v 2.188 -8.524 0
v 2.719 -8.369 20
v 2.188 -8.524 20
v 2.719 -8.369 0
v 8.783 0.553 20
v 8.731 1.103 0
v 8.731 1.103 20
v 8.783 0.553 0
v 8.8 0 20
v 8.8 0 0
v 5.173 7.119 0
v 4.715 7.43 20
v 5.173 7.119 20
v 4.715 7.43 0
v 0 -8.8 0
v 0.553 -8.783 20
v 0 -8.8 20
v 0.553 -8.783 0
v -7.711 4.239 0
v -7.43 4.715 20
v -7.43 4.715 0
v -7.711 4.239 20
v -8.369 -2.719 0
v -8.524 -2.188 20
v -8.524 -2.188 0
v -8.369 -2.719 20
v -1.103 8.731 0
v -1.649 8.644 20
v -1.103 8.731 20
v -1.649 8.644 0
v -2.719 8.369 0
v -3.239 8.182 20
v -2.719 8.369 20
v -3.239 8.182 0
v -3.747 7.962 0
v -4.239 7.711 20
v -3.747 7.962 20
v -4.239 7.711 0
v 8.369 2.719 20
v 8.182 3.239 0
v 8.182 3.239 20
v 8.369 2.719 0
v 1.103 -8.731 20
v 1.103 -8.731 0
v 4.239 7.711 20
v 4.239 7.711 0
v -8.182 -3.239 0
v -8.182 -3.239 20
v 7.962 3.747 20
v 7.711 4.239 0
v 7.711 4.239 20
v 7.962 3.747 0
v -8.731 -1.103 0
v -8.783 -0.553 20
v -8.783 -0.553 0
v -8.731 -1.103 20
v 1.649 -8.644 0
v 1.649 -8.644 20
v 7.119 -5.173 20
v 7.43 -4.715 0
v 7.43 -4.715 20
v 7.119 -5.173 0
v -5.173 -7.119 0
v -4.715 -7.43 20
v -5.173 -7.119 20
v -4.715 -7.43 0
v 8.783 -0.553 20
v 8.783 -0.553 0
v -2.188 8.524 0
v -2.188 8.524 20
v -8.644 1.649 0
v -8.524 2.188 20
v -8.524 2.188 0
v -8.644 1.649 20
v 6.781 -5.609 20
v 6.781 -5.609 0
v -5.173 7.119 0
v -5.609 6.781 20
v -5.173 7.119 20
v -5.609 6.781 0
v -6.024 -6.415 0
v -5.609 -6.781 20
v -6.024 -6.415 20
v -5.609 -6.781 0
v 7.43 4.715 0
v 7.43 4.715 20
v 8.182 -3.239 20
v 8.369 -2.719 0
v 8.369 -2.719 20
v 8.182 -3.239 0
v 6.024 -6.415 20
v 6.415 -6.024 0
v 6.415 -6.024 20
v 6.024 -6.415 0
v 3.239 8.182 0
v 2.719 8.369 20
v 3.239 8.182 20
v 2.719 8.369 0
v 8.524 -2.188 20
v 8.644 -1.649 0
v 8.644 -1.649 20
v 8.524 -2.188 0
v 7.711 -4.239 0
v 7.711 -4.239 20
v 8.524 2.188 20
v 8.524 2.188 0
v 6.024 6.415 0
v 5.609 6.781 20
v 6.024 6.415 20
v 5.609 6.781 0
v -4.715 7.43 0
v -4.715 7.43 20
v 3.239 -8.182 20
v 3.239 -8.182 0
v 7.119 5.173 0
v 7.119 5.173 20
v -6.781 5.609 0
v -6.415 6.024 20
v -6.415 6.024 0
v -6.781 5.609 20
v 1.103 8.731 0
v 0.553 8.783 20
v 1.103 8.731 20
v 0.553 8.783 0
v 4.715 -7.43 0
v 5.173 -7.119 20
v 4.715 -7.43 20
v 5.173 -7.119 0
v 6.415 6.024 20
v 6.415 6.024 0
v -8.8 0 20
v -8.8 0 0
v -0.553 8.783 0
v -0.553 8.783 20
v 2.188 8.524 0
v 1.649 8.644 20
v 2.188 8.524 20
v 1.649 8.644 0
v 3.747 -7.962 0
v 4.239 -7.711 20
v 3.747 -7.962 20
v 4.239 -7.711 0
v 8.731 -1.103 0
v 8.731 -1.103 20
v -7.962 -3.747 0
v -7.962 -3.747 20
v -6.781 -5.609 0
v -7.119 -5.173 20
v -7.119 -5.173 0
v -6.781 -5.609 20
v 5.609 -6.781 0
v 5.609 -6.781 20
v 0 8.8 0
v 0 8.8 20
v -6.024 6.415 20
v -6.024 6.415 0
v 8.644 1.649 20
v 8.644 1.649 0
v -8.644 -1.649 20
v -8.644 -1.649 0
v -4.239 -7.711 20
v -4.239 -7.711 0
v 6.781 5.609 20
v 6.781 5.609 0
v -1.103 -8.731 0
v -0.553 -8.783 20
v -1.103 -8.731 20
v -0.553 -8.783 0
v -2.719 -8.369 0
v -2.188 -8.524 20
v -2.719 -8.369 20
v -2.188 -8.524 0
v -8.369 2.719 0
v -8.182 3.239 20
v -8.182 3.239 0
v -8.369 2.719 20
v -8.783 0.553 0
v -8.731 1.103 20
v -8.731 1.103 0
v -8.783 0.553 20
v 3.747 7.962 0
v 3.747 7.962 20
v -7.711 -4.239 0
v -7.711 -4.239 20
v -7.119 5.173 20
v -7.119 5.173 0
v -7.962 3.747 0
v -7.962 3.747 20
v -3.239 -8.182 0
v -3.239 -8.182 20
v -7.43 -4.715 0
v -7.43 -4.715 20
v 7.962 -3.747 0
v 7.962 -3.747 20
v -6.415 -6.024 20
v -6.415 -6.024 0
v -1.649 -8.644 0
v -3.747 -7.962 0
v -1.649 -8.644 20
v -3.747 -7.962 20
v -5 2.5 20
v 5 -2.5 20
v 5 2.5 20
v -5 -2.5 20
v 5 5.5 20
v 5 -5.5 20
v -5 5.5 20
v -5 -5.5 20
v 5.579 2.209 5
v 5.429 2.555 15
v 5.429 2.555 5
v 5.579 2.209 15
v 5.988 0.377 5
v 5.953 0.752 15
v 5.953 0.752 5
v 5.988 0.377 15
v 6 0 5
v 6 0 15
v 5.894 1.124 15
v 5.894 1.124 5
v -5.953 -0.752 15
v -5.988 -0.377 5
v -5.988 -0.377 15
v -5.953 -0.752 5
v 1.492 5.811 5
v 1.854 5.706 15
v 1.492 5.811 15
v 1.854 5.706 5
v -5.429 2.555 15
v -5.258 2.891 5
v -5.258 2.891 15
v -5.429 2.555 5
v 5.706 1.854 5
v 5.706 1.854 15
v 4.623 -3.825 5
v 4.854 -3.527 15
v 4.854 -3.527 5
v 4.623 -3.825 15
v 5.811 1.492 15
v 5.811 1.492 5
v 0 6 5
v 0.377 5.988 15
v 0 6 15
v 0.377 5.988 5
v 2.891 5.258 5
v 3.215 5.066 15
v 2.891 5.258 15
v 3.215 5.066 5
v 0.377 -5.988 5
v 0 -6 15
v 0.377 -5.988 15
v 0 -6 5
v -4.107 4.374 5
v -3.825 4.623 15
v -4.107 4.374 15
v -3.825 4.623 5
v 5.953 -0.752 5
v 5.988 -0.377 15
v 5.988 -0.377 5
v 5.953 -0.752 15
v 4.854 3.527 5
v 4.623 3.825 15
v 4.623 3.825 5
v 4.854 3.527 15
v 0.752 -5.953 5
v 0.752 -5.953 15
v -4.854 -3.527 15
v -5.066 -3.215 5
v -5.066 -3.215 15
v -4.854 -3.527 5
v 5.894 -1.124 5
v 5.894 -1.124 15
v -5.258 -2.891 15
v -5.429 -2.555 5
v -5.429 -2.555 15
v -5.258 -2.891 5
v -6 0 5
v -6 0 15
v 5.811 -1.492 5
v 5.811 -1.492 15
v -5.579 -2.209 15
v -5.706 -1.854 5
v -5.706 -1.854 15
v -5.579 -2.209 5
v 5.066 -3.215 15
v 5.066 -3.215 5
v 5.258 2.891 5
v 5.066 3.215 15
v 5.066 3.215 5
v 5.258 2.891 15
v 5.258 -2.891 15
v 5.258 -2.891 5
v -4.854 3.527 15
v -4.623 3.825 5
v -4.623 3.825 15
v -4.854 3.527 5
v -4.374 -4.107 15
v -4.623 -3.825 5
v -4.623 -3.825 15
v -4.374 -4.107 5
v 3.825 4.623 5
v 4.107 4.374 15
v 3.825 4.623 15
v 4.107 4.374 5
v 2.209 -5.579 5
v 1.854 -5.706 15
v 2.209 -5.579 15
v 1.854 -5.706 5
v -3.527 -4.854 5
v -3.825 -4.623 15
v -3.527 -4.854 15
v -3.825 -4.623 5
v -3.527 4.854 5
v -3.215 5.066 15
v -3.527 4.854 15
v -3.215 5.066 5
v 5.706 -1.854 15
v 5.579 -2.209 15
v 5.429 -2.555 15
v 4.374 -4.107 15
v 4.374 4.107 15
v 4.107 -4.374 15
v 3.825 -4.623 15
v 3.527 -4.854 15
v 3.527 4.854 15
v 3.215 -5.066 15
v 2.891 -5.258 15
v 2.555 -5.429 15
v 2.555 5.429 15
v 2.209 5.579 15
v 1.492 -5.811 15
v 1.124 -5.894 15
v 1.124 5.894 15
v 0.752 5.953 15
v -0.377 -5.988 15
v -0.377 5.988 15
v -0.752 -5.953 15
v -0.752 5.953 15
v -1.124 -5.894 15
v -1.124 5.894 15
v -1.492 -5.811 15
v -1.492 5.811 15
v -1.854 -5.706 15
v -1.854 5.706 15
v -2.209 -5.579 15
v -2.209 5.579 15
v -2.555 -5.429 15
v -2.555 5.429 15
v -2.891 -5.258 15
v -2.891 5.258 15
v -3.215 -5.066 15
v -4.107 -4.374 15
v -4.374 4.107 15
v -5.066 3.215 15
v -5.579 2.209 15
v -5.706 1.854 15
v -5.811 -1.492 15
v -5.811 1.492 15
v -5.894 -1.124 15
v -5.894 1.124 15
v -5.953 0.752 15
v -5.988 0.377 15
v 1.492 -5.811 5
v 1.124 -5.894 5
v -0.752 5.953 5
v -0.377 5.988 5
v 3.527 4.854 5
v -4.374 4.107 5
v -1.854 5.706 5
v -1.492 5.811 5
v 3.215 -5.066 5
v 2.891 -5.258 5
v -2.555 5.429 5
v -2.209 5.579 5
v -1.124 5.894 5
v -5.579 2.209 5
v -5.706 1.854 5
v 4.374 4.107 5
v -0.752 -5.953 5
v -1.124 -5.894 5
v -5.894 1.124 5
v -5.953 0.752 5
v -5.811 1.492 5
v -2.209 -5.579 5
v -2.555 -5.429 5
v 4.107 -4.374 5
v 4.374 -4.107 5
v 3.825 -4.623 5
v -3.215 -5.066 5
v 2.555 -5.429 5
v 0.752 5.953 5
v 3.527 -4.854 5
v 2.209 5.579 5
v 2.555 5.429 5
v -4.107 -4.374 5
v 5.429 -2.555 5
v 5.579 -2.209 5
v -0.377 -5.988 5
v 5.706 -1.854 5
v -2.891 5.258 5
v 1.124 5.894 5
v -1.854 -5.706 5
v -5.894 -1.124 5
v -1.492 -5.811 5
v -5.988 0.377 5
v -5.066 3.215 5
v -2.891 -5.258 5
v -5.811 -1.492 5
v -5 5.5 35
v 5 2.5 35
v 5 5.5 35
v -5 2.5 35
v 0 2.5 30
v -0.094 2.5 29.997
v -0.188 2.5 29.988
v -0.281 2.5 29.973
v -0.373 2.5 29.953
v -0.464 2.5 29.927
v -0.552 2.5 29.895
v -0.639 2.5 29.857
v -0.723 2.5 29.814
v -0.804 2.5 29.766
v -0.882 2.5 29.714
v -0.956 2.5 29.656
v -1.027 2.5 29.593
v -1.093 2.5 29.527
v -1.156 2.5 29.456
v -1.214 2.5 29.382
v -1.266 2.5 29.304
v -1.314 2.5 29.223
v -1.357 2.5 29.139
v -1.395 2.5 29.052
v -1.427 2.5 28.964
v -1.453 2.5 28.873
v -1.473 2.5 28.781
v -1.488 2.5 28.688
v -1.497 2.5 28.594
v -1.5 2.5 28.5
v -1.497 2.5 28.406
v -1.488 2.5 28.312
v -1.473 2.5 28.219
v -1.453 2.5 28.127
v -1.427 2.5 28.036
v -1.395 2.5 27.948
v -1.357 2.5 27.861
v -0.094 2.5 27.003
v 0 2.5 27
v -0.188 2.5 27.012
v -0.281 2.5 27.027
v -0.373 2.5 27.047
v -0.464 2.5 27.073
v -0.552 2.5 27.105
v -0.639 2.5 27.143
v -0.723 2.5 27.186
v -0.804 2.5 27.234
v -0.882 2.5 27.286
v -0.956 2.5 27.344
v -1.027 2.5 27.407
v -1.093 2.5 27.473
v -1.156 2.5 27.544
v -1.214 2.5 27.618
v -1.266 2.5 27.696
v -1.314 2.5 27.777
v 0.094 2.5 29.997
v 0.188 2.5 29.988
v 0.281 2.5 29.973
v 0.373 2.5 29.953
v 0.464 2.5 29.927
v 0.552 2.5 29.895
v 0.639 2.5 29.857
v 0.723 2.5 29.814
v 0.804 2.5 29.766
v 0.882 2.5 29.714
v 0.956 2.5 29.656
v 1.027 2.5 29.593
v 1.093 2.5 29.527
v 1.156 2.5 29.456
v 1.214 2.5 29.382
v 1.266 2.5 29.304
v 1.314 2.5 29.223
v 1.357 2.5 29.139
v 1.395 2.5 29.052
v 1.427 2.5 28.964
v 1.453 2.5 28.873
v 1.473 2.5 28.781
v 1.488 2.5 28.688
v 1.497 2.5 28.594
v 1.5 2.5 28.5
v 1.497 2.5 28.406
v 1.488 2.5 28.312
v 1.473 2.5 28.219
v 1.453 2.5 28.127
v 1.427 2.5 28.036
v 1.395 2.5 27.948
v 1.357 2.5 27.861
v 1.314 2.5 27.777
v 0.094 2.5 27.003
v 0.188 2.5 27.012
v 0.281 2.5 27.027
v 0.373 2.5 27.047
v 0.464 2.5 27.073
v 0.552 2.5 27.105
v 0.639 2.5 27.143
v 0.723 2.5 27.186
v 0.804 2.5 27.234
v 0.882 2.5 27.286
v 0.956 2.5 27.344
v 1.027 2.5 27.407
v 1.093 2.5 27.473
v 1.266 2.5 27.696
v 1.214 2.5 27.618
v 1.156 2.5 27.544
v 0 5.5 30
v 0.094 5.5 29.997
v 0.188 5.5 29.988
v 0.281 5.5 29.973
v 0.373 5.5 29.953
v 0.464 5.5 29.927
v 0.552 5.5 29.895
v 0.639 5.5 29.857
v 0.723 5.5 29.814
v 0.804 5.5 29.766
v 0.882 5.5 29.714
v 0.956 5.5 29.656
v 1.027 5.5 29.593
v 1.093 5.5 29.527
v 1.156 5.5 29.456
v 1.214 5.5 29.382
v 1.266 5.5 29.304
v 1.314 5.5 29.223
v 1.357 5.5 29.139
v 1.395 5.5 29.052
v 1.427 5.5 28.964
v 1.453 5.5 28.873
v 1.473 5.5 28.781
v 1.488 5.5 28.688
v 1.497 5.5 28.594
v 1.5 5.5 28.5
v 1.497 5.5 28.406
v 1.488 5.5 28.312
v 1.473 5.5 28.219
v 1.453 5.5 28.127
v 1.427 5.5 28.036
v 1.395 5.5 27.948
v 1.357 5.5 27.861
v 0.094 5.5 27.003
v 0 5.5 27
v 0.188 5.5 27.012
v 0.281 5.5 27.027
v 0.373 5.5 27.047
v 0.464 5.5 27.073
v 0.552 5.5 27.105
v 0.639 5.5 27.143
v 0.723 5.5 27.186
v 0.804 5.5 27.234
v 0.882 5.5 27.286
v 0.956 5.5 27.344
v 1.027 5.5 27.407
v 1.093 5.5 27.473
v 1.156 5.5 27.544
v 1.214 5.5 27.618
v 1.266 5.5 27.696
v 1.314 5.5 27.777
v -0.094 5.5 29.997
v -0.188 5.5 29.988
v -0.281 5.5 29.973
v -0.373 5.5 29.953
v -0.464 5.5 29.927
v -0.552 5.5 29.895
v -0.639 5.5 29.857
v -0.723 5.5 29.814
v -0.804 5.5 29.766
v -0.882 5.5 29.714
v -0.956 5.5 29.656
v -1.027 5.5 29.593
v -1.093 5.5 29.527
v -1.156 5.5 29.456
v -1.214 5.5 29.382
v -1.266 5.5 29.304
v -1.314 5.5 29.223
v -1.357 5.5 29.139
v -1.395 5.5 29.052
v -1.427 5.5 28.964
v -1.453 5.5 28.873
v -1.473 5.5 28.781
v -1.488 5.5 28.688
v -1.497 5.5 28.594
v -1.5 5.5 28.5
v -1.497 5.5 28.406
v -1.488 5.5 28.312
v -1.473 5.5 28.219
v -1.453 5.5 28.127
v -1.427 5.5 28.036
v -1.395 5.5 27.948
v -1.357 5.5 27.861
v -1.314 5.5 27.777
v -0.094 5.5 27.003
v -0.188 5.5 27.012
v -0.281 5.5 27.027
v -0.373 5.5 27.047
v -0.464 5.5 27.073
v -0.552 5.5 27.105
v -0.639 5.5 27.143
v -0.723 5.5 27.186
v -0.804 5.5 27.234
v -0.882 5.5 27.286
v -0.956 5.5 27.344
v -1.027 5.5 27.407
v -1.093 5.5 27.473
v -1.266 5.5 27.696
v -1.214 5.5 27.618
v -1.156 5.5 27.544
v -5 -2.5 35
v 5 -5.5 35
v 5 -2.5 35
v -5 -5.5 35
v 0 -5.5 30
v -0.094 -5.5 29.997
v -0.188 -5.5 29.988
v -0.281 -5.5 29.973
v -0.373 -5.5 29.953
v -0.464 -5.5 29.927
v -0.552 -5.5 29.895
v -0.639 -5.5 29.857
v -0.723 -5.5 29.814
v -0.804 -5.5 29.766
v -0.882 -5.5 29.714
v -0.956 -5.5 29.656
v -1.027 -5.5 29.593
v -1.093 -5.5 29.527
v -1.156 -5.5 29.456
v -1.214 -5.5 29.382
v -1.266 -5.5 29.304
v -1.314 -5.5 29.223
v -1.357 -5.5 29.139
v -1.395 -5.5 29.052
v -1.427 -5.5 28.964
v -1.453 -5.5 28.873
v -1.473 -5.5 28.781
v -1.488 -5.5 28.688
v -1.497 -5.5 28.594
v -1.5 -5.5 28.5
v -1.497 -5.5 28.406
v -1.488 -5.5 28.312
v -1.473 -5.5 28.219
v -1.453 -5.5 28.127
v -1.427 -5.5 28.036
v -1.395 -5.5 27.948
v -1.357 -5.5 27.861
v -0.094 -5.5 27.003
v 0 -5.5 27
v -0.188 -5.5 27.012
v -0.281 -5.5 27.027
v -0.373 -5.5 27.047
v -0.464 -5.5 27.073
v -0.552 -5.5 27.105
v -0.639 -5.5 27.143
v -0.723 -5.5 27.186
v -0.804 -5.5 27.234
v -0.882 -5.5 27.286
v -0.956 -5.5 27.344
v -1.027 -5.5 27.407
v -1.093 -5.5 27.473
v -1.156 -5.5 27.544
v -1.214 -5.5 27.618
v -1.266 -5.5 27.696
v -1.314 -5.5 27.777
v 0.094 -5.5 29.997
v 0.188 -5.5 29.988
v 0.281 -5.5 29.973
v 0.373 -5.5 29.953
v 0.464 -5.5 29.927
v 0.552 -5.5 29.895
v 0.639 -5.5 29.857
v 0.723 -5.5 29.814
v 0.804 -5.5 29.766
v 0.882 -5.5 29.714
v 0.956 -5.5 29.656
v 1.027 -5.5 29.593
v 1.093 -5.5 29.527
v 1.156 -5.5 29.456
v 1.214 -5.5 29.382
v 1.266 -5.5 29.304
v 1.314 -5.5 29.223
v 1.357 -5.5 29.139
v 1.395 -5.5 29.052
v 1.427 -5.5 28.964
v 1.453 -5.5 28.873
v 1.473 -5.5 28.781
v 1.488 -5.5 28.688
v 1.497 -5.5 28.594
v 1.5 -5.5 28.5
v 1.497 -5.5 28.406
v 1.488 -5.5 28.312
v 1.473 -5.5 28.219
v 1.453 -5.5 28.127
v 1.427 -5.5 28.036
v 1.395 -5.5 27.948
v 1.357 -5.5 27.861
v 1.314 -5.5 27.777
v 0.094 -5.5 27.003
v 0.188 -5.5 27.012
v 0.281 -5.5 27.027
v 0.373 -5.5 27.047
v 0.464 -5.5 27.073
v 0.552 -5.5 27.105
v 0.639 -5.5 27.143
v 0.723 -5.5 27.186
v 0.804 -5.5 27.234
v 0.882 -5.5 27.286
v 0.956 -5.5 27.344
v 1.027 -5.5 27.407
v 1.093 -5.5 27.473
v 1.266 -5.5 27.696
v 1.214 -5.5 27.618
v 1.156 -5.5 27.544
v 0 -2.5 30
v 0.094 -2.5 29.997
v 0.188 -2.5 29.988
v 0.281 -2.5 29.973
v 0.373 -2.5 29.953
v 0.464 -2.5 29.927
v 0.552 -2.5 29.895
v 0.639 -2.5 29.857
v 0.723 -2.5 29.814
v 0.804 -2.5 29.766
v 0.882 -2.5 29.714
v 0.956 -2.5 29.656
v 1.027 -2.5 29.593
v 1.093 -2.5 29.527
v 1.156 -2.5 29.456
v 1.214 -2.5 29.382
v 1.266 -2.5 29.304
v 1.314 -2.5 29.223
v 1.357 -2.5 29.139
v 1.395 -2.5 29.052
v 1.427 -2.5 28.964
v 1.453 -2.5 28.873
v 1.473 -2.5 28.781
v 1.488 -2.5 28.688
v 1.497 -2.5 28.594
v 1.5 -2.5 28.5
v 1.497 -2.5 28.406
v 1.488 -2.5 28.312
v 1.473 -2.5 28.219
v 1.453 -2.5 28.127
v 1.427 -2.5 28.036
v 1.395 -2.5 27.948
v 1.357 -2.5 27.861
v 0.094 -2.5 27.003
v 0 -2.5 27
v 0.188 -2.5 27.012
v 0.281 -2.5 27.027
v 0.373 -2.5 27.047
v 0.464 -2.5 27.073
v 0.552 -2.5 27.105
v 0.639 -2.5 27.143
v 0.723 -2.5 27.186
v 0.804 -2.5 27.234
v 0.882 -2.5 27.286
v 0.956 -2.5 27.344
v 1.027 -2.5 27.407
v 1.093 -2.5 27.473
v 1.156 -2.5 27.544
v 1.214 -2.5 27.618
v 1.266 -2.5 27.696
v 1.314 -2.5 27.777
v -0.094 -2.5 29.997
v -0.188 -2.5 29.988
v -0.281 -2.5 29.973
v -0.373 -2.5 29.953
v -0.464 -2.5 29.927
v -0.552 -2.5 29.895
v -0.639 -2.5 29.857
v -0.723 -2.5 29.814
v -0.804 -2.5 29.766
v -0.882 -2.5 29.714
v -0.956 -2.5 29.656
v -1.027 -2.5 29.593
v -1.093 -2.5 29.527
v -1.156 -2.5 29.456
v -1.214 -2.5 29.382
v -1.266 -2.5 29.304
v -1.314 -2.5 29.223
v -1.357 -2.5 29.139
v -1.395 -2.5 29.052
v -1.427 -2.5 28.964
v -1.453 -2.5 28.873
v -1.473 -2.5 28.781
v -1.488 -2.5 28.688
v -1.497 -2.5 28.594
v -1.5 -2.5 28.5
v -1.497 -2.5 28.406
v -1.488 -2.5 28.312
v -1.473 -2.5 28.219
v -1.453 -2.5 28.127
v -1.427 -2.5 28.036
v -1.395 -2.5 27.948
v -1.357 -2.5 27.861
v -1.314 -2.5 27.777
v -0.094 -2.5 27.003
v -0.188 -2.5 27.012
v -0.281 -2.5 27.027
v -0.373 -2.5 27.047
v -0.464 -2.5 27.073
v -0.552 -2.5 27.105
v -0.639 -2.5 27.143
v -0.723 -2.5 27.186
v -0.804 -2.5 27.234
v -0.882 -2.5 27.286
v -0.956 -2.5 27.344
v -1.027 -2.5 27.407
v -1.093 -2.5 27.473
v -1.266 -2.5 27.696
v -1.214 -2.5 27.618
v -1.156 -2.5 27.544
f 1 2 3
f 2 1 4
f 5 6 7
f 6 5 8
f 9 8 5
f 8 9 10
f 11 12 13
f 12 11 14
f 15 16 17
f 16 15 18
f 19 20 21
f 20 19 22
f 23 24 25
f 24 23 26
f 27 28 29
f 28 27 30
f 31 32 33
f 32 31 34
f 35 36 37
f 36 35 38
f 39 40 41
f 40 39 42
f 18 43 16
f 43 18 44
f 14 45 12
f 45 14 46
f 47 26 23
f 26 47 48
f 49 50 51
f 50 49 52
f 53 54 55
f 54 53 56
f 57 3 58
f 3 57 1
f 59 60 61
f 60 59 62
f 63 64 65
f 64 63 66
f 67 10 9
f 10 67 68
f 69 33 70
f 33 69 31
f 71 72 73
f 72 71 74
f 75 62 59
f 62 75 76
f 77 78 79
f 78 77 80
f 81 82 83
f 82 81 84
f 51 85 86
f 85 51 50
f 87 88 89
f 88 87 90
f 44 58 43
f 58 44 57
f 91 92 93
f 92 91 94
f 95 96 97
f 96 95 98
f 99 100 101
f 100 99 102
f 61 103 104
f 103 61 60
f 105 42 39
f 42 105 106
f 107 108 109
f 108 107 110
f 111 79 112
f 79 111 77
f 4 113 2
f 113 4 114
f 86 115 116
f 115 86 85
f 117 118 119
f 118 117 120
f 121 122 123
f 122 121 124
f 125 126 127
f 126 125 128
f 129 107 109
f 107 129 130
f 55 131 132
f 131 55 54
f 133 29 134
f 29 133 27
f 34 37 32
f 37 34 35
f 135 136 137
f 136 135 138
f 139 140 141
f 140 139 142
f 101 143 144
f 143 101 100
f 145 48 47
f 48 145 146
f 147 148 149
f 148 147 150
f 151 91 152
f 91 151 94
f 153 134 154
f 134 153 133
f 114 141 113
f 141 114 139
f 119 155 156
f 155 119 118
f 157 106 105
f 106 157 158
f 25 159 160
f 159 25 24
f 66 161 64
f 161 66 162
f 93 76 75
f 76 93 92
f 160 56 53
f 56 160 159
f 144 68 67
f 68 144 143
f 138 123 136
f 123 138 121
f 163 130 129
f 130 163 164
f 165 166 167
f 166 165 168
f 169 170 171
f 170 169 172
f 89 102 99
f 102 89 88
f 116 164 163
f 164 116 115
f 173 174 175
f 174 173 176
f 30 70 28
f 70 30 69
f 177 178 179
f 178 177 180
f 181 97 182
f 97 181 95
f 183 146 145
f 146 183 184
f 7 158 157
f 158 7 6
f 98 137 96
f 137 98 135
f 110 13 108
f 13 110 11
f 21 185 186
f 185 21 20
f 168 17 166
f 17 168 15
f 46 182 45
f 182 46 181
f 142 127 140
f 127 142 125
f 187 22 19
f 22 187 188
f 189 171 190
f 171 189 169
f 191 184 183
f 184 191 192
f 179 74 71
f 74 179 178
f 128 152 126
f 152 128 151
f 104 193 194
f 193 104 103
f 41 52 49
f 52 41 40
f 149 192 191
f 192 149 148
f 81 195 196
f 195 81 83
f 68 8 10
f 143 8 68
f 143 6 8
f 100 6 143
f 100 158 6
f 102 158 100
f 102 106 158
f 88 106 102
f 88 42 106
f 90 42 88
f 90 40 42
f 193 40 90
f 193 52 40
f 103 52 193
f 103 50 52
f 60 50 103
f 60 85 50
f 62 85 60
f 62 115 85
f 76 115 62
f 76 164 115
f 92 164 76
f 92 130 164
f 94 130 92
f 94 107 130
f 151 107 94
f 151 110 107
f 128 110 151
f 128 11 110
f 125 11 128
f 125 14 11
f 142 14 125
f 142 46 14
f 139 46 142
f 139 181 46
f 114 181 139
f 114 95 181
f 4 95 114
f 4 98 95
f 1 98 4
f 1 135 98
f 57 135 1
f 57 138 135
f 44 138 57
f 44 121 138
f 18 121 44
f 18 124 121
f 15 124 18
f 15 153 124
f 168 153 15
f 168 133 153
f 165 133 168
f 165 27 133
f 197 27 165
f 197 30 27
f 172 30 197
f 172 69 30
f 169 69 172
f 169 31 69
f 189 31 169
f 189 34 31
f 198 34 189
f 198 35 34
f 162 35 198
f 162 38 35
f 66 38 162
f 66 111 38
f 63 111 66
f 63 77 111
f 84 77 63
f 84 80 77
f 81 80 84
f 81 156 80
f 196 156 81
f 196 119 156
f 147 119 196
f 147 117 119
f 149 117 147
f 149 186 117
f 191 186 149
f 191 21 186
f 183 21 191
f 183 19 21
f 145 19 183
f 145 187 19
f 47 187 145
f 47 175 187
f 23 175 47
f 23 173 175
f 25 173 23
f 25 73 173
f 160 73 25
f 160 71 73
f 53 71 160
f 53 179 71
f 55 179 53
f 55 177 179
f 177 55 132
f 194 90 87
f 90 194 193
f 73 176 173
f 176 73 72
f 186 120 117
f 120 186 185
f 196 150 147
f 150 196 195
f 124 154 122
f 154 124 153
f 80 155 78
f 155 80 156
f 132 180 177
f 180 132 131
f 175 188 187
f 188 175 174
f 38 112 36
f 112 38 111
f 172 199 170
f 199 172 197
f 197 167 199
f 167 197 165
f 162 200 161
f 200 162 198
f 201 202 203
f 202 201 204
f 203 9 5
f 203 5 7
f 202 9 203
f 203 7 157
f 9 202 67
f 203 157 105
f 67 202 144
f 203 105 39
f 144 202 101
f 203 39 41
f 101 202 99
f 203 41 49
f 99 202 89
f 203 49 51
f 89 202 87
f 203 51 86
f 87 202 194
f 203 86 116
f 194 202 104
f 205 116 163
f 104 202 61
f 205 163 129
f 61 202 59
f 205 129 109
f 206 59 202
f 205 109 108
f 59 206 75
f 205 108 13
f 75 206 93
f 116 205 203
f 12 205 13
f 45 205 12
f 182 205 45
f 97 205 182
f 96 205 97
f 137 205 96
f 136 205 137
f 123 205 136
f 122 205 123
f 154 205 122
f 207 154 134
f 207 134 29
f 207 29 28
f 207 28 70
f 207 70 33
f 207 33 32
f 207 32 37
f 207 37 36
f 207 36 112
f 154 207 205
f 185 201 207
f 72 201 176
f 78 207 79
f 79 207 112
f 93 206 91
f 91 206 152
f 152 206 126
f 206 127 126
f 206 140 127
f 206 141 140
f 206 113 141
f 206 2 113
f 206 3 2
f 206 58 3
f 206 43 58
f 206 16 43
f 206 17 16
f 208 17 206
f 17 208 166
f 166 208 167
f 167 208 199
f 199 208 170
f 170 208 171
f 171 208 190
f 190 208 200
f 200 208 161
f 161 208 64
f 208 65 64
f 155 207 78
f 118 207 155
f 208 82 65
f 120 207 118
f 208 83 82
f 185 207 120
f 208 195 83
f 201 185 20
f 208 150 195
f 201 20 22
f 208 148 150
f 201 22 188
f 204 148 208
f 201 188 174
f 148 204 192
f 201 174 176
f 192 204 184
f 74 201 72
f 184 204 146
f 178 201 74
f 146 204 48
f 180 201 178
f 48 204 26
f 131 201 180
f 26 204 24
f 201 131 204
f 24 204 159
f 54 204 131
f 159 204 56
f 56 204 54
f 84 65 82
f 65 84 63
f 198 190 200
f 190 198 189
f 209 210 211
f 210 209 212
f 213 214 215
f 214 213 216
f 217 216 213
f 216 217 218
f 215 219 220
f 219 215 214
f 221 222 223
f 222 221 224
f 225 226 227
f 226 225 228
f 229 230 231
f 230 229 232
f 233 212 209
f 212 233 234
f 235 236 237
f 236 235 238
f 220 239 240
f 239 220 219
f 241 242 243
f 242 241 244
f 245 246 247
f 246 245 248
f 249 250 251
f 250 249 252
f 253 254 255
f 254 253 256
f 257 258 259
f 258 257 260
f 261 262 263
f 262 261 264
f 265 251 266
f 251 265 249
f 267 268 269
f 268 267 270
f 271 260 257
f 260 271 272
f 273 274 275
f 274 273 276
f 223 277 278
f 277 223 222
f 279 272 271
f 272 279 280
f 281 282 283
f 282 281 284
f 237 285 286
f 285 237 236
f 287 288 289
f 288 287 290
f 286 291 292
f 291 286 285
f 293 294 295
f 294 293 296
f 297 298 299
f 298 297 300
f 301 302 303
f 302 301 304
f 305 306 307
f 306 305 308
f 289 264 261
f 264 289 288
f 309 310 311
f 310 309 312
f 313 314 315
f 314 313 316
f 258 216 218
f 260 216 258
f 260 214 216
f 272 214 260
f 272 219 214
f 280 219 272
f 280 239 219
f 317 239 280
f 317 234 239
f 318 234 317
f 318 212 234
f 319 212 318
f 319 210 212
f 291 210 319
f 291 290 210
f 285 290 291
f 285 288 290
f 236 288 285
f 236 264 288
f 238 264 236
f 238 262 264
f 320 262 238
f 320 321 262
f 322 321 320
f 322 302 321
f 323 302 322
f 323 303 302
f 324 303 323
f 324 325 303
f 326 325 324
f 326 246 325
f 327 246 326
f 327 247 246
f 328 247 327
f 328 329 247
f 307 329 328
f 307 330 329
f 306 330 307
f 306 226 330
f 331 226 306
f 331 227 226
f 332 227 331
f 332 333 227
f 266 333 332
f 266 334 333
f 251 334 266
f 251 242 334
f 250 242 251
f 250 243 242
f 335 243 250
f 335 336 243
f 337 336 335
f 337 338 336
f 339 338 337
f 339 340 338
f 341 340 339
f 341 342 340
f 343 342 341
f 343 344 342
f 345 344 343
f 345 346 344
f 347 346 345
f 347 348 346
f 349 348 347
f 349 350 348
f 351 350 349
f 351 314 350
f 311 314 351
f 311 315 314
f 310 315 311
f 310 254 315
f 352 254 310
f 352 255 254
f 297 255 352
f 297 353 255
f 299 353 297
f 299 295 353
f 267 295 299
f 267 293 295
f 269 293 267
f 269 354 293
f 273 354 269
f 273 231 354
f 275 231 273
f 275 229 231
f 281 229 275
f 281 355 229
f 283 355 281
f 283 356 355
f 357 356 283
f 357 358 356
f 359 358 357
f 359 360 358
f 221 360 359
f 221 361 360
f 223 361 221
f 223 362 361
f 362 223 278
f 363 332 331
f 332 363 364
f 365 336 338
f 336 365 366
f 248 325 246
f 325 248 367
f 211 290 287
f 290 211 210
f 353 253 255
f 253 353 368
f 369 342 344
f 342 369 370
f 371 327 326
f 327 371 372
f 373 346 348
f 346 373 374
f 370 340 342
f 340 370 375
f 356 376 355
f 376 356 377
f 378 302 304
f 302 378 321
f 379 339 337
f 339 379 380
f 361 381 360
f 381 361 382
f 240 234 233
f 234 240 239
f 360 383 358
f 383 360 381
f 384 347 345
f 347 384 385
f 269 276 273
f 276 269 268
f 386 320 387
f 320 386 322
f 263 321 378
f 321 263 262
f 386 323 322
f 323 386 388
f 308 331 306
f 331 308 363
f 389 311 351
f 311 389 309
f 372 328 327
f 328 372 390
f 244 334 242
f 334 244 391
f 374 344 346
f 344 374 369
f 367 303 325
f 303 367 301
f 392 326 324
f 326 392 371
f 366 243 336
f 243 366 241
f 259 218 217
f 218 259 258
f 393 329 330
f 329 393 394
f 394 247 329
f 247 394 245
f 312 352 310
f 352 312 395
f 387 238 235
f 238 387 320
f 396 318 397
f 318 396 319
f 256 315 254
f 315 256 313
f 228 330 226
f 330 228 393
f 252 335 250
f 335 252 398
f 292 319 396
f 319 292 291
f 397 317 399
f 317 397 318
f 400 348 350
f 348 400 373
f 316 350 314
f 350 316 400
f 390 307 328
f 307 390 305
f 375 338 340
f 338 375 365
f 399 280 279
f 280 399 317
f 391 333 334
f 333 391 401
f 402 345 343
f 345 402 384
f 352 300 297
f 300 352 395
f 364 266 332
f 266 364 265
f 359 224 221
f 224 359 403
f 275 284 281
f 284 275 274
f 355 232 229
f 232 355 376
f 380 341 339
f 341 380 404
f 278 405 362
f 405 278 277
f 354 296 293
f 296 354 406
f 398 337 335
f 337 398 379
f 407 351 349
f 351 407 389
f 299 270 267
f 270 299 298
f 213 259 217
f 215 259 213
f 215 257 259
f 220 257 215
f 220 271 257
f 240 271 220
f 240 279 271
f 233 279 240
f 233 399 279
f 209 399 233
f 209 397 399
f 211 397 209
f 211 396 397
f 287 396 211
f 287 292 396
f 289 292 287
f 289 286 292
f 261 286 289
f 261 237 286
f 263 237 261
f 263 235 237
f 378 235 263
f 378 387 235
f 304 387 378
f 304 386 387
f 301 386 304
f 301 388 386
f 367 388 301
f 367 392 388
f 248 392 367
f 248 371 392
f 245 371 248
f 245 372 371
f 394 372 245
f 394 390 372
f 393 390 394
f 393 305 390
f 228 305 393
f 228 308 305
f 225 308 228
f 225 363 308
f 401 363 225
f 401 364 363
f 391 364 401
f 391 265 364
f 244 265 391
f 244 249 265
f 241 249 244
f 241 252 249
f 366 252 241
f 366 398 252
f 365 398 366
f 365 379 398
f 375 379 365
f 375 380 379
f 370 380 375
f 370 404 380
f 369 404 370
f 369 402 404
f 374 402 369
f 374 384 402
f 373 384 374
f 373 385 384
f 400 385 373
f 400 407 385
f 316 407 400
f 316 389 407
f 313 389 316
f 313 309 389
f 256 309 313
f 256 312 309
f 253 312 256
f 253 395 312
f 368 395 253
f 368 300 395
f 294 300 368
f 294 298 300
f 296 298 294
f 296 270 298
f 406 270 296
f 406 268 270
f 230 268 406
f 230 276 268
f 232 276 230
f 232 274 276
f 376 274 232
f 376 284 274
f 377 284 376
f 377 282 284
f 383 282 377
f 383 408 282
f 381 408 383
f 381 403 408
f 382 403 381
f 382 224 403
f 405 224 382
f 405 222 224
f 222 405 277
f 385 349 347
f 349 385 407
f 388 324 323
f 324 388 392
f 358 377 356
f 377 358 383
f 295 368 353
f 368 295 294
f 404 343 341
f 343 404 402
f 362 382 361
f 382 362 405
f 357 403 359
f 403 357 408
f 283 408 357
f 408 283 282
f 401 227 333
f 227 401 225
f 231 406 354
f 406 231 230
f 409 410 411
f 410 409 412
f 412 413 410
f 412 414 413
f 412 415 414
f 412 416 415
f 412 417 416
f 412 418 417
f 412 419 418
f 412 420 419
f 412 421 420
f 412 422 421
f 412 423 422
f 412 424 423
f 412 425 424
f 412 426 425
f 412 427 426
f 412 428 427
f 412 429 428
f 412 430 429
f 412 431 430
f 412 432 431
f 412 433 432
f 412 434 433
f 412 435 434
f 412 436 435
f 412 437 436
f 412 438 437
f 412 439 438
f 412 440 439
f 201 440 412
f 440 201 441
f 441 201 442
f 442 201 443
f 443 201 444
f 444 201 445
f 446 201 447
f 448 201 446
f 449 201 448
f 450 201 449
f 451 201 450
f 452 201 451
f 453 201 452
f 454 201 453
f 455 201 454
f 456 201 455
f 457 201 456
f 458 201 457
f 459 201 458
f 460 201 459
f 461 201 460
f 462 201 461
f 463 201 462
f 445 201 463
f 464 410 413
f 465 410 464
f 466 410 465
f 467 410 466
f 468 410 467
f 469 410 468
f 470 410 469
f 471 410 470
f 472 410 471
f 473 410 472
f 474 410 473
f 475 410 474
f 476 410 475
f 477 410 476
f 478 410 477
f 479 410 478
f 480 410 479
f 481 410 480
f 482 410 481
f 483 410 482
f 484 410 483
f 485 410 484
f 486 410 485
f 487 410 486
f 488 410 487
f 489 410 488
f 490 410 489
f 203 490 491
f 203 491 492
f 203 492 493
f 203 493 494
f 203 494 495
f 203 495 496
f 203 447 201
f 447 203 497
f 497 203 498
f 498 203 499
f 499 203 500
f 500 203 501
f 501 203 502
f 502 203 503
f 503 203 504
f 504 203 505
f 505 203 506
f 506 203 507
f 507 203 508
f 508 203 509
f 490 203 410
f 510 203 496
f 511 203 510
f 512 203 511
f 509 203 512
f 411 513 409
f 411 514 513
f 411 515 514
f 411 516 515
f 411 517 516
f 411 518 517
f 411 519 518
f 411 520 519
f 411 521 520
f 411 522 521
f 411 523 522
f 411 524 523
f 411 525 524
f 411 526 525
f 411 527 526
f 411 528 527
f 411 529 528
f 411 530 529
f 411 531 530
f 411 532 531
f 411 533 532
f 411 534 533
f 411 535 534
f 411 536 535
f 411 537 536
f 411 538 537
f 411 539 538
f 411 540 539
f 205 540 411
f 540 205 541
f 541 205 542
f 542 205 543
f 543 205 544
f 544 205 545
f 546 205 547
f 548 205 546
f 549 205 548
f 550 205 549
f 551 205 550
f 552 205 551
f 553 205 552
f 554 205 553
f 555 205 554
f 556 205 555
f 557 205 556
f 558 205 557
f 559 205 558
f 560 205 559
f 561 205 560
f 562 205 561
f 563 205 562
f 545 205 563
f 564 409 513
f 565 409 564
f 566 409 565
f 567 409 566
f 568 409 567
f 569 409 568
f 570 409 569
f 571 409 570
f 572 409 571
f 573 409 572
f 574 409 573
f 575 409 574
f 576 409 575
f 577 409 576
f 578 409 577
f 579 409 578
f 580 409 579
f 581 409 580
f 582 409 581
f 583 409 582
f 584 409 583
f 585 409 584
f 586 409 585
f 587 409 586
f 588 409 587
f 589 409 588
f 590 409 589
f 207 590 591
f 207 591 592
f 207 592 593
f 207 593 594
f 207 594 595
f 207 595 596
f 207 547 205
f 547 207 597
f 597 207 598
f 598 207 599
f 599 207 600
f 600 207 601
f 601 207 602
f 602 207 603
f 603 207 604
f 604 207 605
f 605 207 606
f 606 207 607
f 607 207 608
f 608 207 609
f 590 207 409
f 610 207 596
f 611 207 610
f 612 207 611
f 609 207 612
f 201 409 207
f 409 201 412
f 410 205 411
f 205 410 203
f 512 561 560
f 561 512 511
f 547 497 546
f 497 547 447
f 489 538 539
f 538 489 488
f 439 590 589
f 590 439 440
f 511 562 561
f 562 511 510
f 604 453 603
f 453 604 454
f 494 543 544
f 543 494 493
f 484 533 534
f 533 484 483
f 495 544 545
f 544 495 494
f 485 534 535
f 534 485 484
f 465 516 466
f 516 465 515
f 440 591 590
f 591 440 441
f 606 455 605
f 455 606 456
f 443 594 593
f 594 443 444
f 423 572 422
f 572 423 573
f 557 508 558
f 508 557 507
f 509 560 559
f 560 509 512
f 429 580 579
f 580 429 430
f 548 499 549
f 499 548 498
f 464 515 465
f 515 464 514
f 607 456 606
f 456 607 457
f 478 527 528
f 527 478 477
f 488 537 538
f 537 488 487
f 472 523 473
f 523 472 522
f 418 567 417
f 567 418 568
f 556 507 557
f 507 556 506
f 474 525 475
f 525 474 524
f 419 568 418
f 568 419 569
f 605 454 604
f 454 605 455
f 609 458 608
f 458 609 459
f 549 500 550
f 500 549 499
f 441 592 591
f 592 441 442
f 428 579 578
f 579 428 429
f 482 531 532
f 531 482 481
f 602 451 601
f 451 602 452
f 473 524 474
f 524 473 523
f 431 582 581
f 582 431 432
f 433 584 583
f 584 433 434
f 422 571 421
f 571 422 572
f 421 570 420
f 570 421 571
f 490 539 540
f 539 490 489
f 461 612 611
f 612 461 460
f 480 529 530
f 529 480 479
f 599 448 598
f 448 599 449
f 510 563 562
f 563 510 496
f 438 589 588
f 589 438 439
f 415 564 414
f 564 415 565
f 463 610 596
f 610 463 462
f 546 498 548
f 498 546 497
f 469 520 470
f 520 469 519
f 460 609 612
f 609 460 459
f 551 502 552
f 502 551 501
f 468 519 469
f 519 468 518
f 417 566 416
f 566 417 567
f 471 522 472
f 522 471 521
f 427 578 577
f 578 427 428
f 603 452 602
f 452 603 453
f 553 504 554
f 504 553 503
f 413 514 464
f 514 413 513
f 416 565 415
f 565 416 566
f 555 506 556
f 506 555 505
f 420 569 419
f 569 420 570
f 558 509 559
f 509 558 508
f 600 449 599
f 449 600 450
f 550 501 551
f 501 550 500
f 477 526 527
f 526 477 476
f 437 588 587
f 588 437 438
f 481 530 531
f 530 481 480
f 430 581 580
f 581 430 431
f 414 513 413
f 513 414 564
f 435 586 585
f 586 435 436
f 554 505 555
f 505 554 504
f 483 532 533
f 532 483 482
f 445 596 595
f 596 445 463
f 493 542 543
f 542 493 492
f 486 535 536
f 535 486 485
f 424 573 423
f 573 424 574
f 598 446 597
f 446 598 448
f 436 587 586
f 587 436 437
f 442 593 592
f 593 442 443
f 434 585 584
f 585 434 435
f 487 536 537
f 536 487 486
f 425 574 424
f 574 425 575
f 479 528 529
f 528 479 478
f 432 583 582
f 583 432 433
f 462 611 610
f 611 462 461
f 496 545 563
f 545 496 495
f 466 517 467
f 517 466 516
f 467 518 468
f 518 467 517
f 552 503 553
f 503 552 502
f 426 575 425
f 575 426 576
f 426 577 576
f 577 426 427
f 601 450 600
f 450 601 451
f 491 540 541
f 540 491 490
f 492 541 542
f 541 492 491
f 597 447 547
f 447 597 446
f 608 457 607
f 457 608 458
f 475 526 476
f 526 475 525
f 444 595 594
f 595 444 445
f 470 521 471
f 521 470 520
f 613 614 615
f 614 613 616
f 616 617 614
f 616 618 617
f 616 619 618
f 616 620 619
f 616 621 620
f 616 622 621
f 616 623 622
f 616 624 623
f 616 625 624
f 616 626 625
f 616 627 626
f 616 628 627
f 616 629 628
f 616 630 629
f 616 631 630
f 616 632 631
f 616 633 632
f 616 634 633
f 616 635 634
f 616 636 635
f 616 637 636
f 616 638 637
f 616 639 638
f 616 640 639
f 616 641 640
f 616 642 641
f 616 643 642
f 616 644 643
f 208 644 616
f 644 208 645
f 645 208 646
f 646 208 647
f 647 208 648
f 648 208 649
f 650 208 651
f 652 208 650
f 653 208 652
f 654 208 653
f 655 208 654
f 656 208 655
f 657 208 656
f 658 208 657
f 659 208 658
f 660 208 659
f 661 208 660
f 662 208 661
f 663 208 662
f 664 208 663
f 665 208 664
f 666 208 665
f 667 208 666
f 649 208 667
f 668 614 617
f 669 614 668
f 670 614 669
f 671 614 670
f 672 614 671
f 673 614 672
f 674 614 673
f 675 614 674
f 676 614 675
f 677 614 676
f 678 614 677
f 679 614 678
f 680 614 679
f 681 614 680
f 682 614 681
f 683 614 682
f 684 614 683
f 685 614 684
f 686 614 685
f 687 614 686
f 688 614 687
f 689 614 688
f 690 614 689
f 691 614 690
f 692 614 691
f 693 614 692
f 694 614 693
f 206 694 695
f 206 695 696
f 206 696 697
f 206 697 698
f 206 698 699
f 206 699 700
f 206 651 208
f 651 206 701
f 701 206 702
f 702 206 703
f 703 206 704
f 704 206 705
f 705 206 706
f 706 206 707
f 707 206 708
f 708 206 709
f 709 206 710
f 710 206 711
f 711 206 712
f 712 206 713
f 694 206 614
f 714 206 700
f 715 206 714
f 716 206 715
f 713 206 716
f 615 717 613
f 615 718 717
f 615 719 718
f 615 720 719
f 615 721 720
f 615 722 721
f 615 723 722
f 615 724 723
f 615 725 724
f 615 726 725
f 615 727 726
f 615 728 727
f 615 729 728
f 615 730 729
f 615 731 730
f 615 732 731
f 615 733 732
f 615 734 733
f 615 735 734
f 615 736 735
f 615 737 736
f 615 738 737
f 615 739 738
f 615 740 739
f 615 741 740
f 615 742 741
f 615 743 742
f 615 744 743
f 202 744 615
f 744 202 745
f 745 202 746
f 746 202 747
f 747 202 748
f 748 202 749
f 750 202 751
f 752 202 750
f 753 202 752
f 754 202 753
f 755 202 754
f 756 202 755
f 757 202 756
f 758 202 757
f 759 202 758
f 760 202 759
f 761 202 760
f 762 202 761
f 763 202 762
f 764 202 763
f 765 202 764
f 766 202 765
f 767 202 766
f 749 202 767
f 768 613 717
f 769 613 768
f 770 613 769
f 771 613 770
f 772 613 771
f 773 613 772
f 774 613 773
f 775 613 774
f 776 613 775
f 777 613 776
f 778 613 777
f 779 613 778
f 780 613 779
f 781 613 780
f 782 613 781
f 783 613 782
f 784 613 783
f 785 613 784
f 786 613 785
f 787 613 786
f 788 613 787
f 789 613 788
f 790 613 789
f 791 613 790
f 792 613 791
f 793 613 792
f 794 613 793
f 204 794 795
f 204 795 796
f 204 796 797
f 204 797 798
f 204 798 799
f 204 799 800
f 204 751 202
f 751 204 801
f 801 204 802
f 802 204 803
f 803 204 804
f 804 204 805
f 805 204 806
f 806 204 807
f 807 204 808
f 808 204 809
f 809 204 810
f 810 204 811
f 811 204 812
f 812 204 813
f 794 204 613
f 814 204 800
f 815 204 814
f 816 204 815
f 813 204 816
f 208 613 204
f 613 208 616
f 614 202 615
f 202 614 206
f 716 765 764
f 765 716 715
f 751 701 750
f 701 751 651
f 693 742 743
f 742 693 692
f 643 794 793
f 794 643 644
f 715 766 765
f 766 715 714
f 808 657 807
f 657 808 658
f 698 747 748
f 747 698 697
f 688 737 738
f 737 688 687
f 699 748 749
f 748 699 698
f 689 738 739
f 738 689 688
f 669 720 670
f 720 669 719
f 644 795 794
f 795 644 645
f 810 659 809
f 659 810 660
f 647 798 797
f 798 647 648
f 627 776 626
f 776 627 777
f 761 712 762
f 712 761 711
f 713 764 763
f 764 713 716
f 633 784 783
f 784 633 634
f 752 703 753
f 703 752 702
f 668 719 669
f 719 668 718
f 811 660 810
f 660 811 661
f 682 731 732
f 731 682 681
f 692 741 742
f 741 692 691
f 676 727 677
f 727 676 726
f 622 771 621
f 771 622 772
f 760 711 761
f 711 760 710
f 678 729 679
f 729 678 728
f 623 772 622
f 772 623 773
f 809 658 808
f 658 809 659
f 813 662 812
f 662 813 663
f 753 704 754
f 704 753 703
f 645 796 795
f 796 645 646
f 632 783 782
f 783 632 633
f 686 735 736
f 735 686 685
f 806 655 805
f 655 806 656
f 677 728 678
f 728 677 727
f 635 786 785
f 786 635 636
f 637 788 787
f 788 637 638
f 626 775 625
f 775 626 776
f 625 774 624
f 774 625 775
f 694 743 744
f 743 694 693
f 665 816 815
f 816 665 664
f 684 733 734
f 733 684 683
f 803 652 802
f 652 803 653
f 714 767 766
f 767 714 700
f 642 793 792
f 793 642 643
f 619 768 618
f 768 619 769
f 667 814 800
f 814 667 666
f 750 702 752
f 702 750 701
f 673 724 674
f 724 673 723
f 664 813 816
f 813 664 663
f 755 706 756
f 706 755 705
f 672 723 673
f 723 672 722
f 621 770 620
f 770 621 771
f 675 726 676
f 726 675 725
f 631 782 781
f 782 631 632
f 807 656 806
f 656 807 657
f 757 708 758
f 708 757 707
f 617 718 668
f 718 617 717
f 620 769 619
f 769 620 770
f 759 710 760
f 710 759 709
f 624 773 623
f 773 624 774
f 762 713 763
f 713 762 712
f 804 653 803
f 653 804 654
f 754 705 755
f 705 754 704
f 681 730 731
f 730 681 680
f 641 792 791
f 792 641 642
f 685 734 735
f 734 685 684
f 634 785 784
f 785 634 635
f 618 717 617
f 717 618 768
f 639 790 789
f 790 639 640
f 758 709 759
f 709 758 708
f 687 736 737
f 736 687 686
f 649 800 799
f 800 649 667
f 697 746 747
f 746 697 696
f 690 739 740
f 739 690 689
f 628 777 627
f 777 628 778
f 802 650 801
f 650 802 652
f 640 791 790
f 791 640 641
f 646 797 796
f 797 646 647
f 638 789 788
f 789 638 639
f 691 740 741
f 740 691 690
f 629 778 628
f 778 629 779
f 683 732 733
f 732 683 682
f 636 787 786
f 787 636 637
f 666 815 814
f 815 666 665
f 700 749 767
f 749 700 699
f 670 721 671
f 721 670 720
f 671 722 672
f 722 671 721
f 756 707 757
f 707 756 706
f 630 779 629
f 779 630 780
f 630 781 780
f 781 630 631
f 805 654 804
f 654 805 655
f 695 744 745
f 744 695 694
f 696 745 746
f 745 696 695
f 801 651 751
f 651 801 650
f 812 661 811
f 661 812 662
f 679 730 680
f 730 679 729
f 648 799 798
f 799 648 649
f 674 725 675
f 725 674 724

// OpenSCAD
//*******************************************************
// ********** Prusa Rounded Clip by MacFly **************
// **            made dec 02 2015                      **
//*******************************************************

//--------------------------------------------------------------------------------------//
$fn = 100;
CYLINDER_HEIGHT = 20;         // cylinder height mm - Hauteur du cylindre en mm
CYLINDER_RADIUS = 8.80;      // cylinder radius mm - Rayon du cylindre en mm
TAB_LENGTH = 15;            //  Tab length - longueur de la languette en mm
TAB_THICKNESS = 3;         // 5mm thickness - Epaisseur de la languette
TAB_WIDTH = 10;           // Tab width mm - Largeur de la languette en mm
SCREW_HOLE_RADIUS = 1.5; // screw hole radius - Diamètre du trou pour la vis
SCREW_HOLE_OFFSET = 5; // tab screw hole 5mm from the edge - distance du trou 5mm du bord extérieur
EXTRUSION_THICKNESS = 6; // 8.80 - 6 = 2.8 / 2 = 1.4mm shell thickness - Epaisseur de l'extrusion intérieur du cylindre

module Maincylinder()
    {
    difference(){
        
            cylinder(r=CYLINDER_RADIUS, h=CYLINDER_HEIGHT);
            translate([0,0,5]) ExtruCylinder();
        }
        
      
        
    }
module ExtruCylinder()
    {    
            #cylinder(r=EXTRUSION_THICKNESS, h=CYLINDER_HEIGHT - 10);  
    }
module tab()
    {
        
    difference() 
        {
            translate([0,0,0]) rotate([90,90,0]) cube([TAB_LENGTH,TAB_WIDTH,TAB_THICKNESS]);
            translate([5,75,-SCREW_HOLE_OFFSET - 1.5]) rotate([90,90,0]) #cylinder(r=SCREW_HOLE_RADIUS,h=150);
        }
    }


Maincylinder();
    translate([-TAB_WIDTH/2,TAB_THICKNESS + 2.5,CYLINDER_HEIGHT + TAB_LENGTH]) tab();
    translate([-TAB_WIDTH/2,-2.5,CYLINDER_HEIGHT + TAB_LENGTH]) tab();
